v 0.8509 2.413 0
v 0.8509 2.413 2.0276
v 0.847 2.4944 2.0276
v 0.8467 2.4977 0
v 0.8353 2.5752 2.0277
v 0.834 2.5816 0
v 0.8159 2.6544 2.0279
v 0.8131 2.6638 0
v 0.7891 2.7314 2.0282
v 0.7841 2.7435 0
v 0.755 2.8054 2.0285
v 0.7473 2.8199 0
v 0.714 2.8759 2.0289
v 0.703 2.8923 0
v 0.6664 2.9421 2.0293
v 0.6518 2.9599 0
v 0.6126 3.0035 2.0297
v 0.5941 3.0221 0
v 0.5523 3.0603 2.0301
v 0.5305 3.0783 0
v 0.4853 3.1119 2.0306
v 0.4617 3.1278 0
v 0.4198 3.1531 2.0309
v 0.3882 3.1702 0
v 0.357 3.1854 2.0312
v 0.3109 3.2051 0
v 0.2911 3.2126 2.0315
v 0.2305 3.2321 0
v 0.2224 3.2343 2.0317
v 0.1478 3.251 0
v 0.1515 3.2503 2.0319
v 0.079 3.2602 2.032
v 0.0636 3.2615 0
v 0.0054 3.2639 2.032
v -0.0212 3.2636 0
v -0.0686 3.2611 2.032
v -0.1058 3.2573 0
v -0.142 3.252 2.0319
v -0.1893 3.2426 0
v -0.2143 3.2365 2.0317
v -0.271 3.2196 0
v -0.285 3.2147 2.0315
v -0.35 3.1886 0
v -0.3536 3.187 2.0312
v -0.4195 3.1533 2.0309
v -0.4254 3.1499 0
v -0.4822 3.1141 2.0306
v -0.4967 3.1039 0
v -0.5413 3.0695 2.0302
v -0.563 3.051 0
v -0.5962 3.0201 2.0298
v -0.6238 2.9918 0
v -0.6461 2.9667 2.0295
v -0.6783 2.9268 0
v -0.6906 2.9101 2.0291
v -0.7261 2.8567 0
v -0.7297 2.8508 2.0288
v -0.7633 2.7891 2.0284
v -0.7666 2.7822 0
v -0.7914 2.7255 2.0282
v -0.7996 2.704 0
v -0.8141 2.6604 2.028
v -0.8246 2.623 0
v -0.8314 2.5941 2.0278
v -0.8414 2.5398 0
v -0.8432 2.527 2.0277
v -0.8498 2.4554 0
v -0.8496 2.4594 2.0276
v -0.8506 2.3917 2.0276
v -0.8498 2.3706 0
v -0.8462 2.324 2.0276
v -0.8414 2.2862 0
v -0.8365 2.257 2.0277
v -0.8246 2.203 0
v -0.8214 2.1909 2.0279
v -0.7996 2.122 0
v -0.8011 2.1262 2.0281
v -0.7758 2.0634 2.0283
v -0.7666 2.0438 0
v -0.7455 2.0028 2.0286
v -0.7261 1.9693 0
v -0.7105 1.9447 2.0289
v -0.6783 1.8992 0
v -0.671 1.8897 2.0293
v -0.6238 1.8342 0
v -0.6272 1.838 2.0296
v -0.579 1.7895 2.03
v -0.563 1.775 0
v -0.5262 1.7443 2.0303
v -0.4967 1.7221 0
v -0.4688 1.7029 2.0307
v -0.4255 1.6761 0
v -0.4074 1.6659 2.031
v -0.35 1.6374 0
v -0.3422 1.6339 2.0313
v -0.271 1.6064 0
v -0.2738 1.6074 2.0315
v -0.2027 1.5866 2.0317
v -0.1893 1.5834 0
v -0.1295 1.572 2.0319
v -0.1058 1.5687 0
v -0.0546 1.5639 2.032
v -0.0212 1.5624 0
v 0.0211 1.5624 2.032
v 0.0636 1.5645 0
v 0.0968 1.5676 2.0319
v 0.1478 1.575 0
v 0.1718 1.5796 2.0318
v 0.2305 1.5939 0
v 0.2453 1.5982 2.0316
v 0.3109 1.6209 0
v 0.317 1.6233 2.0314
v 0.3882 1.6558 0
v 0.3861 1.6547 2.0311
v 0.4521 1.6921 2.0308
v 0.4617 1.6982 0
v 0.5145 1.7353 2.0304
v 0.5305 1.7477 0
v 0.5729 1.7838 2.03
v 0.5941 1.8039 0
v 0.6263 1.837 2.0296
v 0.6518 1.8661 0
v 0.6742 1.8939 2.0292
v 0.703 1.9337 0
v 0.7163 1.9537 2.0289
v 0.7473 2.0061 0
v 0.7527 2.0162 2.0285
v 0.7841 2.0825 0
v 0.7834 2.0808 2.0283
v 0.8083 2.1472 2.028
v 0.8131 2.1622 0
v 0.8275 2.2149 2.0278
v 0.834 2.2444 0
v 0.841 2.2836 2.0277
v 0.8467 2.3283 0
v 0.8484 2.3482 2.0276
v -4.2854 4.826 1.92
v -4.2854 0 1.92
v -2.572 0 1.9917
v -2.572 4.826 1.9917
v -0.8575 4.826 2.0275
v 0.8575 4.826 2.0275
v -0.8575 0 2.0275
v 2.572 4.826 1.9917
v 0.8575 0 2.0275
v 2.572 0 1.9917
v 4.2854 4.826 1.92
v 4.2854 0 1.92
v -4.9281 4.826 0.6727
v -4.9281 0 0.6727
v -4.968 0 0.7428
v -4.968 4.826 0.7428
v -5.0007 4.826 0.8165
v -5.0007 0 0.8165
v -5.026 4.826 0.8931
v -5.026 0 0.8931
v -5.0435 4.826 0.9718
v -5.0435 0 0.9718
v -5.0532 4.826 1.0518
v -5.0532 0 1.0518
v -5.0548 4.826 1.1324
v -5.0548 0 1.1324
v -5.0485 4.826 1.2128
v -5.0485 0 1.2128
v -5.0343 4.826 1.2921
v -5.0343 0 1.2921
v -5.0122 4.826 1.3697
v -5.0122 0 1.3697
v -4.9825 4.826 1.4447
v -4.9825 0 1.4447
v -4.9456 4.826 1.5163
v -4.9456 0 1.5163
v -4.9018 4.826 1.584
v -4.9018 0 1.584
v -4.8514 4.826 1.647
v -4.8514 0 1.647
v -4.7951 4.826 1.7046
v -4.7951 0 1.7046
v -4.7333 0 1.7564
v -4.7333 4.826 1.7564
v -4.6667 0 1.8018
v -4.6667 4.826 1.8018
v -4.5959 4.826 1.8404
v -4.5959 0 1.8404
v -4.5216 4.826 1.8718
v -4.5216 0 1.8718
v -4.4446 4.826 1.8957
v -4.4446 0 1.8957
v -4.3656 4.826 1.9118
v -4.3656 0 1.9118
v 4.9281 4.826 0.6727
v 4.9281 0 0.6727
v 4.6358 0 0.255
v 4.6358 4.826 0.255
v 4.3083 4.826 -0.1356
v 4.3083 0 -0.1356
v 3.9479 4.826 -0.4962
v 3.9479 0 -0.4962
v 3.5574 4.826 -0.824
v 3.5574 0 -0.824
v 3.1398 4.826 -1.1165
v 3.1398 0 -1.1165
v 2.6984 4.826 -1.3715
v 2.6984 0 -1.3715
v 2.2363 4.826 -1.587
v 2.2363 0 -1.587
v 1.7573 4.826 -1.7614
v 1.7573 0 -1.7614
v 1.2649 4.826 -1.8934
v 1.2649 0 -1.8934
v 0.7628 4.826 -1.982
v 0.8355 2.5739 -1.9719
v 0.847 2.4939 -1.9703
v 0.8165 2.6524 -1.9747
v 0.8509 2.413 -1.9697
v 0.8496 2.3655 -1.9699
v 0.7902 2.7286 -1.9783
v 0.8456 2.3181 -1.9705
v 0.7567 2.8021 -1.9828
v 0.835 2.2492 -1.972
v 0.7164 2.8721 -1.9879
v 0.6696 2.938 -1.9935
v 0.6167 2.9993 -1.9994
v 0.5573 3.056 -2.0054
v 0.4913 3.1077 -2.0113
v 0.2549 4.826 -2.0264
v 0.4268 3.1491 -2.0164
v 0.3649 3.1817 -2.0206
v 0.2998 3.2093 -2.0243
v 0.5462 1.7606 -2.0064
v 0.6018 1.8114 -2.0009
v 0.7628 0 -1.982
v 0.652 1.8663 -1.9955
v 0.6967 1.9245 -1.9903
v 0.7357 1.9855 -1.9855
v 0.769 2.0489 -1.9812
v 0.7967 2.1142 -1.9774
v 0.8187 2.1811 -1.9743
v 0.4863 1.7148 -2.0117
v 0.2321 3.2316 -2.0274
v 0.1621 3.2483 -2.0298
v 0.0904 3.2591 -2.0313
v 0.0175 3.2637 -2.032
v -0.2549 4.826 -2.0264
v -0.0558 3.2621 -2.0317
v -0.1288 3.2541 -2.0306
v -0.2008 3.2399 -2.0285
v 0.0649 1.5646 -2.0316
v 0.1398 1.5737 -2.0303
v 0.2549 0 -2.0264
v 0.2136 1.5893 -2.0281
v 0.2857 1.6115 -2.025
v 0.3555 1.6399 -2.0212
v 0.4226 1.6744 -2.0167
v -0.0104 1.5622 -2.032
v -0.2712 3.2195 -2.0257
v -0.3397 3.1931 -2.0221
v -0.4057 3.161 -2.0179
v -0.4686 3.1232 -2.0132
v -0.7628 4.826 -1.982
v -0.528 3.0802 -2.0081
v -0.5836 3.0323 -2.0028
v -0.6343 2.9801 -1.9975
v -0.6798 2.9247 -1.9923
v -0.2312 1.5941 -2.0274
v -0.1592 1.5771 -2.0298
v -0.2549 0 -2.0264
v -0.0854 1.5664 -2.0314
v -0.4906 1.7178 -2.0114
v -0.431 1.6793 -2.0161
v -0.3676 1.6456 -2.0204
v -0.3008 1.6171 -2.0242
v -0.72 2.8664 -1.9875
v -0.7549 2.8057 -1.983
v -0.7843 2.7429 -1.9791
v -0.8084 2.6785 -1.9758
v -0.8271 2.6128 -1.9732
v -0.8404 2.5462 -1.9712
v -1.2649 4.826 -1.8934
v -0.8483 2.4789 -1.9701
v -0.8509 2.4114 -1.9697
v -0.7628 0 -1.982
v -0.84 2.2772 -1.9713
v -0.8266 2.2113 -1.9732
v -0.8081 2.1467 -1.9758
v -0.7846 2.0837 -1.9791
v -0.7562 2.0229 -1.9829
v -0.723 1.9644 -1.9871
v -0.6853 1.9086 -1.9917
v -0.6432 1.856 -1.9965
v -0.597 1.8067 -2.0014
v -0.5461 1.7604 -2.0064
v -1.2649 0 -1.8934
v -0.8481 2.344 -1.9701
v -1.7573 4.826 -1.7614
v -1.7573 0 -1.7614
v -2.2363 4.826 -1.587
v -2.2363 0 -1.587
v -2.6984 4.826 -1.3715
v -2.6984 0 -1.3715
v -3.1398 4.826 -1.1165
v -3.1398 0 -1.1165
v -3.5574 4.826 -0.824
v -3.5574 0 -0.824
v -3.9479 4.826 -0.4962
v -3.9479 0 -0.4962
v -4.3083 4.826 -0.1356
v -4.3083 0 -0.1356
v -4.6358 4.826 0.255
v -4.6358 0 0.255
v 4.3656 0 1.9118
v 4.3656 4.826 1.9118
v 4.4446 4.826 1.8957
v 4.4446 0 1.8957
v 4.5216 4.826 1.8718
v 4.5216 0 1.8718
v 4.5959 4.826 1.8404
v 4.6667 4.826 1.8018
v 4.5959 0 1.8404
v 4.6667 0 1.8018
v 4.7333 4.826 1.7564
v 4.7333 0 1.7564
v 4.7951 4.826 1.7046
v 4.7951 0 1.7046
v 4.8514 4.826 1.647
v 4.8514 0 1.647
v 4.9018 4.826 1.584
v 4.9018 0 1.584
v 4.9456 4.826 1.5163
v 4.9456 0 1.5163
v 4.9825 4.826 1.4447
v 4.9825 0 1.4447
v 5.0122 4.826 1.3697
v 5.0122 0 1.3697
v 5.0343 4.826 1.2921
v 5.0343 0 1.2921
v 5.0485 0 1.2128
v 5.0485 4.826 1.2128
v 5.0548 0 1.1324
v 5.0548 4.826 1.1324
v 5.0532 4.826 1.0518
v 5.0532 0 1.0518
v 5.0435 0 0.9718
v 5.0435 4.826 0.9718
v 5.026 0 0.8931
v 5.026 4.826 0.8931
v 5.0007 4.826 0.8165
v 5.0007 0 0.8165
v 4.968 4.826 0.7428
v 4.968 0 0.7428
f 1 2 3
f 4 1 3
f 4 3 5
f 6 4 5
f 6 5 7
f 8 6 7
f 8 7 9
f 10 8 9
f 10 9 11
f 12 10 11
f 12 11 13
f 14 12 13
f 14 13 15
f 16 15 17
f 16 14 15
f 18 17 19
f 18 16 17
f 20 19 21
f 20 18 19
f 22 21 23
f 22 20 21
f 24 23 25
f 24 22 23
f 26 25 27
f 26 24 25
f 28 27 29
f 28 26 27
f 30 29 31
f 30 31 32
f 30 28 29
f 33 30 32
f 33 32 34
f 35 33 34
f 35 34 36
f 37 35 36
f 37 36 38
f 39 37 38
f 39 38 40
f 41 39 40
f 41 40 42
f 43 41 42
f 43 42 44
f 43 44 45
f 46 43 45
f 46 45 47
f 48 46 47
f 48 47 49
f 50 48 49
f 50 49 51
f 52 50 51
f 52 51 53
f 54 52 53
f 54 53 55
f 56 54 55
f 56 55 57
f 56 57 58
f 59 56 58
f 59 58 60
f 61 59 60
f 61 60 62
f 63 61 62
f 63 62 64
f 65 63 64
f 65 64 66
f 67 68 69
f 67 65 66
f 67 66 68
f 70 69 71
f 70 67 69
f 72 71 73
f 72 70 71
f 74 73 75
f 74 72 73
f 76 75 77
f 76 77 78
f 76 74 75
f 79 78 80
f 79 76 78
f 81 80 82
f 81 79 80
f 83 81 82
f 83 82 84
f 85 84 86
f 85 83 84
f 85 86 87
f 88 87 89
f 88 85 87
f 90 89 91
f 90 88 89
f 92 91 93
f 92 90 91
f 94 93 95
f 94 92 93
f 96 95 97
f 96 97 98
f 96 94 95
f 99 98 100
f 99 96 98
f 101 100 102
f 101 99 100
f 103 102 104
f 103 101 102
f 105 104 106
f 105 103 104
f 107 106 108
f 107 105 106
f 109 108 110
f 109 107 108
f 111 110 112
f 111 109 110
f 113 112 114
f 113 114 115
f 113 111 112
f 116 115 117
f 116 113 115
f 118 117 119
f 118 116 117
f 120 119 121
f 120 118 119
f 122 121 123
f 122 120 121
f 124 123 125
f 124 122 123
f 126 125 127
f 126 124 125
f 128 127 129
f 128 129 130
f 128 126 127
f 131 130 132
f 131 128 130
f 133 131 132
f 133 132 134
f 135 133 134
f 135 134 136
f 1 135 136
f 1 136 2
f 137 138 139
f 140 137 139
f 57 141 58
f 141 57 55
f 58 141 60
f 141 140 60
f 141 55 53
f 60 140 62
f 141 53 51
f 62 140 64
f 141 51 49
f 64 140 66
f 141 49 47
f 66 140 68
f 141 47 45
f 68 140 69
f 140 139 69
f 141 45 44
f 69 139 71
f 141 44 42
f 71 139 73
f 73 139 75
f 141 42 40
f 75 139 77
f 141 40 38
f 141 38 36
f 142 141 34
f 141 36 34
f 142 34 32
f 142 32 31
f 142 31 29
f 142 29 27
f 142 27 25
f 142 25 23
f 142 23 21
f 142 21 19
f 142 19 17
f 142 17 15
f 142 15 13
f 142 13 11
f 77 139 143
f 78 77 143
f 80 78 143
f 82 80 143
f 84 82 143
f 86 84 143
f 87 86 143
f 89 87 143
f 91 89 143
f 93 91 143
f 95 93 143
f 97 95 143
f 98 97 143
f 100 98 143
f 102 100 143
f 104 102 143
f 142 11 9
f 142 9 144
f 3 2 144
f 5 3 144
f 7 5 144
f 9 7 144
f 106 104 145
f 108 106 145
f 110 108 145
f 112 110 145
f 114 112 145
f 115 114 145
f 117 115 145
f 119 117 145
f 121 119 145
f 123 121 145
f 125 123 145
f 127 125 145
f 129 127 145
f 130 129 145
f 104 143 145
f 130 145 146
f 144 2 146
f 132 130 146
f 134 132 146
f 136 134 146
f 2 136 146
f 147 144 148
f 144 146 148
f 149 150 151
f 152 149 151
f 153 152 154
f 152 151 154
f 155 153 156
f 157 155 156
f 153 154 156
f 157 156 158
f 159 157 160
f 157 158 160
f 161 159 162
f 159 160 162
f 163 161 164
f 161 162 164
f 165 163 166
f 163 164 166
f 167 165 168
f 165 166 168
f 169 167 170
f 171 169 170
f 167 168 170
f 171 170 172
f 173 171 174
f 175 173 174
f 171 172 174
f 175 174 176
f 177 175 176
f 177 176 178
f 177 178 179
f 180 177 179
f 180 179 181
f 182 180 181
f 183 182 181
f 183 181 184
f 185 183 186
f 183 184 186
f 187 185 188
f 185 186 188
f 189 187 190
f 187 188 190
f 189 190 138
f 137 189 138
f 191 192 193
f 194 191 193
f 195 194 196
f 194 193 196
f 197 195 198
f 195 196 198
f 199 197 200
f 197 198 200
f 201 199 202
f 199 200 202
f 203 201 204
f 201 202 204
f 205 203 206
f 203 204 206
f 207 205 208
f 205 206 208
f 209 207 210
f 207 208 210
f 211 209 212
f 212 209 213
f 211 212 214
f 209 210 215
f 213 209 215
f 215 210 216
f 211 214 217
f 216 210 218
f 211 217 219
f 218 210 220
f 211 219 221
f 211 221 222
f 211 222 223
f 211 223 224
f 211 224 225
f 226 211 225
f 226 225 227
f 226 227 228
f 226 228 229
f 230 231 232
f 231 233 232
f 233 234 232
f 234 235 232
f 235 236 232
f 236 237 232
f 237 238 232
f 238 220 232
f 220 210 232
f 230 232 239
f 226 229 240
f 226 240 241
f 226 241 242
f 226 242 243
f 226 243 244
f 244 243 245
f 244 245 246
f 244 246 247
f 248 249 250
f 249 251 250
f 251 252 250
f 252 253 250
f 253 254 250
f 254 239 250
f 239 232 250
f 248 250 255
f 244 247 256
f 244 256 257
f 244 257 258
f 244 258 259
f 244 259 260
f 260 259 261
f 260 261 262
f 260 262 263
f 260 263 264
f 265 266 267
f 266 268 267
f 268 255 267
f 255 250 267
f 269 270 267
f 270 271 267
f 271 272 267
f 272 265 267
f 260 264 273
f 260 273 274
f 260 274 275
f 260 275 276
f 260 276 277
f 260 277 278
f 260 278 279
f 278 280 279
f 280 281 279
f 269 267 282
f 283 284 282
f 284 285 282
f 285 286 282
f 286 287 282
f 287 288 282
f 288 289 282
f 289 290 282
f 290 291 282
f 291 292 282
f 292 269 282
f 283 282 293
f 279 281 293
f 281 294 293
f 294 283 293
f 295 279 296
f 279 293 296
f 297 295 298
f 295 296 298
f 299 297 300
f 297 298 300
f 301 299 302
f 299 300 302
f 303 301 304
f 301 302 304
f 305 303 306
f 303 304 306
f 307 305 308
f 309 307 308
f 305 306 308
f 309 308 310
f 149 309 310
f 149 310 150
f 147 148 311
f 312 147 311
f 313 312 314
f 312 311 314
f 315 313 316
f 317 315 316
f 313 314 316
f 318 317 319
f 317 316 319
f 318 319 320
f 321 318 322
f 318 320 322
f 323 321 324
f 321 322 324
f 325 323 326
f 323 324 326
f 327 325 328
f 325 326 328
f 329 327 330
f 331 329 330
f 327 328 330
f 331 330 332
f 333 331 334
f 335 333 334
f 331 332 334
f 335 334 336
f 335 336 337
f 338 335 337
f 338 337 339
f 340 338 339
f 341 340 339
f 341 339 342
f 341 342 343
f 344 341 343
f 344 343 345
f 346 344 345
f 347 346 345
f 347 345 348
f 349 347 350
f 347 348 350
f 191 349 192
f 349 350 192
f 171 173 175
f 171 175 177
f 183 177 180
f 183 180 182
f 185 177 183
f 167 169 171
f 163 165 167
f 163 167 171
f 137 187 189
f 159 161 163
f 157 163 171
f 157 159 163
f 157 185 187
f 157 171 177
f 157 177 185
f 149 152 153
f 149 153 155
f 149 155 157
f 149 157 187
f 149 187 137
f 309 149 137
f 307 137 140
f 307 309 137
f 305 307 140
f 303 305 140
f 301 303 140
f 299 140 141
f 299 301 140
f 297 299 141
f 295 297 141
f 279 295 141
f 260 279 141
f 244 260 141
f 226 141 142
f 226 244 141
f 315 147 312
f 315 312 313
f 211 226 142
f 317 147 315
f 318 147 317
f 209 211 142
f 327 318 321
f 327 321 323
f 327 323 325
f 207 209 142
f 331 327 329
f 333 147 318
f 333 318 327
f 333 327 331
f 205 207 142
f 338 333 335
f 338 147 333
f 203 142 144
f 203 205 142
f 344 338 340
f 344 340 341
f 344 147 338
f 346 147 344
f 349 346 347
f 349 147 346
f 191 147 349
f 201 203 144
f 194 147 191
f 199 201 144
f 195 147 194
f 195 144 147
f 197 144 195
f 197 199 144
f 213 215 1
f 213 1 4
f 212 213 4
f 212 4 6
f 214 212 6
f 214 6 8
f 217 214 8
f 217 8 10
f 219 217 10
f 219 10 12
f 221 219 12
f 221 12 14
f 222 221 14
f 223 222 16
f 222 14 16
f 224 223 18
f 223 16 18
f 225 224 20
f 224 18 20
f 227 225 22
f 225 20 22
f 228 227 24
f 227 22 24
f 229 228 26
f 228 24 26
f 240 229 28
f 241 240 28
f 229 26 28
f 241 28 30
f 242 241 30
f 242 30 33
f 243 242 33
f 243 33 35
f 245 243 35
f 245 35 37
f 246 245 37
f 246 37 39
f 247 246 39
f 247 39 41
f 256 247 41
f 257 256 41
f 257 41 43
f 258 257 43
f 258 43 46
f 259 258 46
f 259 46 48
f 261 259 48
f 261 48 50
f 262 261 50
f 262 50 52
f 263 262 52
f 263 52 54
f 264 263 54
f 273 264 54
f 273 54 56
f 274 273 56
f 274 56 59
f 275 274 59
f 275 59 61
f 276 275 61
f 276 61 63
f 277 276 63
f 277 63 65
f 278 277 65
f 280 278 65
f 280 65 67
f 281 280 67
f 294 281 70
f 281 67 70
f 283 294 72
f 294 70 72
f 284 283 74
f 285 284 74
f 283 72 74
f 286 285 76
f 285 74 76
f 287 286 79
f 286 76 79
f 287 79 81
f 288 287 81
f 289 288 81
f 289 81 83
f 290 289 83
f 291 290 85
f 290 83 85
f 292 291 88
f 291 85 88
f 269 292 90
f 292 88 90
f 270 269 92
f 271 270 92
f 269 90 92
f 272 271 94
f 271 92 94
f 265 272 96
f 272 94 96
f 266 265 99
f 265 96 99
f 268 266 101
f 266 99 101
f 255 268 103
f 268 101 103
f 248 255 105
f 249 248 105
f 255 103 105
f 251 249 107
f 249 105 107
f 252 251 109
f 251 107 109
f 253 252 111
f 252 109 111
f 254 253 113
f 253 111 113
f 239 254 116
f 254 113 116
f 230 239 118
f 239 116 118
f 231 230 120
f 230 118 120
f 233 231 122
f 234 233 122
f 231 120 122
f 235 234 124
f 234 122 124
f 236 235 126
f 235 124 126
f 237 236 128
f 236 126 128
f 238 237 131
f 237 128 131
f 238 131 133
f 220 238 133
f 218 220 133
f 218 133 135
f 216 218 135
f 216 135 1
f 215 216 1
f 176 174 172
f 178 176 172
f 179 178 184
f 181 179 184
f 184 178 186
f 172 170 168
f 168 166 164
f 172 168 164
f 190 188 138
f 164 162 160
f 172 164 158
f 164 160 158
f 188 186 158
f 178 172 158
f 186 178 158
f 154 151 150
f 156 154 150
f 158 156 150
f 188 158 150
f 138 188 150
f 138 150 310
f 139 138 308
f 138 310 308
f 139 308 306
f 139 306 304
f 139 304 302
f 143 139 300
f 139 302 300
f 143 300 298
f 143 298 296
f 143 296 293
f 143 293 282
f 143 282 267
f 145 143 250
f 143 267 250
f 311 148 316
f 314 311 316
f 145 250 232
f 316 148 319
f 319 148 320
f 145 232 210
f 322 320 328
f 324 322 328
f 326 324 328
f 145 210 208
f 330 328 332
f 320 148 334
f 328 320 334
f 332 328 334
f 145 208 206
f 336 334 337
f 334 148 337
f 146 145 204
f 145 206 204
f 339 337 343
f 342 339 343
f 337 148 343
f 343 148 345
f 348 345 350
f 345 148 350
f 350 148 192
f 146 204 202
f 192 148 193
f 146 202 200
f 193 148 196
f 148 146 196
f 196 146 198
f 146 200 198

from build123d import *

# Parameters (mm, degrees)
BOSS_EXTRUDE1_DEPTH     = 4.826
CUT_EXTRUDE1_DEPTH      = 4.826
CUT_EXTRUDE1_DEPTH_BACK = 4.826
SKETCH2_R               = 0.8509


with BuildPart() as part:
    # Sketch1 → Boss-Extrude1 (new body)
    with BuildSketch(Plane(origin=(0, 0, 0), x_dir=(1, 0, 0), z_dir=(0, 1, 0))):
        with BuildLine():
            ThreePointArc((-4.285409449, -1.920000792), (0, -2.032), (4.285409449, -1.920000792))
            ThreePointArc((4.285409449, -1.920000792), (4.964968073, -1.480948711), (4.928136529, -0.672734574))
            ThreePointArc((4.928136529, -0.672734574), (0, 2.032), (-4.928136529, -0.672734574))
            ThreePointArc((-4.928136529, -0.672734574), (-4.964968073, -1.480948711), (-4.285409449, -1.920000792))
        make_face()
    extrude(amount=BOSS_EXTRUDE1_DEPTH)

    # Sketch2 → Cut-Extrude1 (cut, two sides: drawn at the far end of the back side and taken through both)
    with BuildSketch(Plane.XY.offset(-CUT_EXTRUDE1_DEPTH_BACK)):
        with Locations((0, 2.413)):
            Circle(SKETCH2_R)
    extrude(amount=CUT_EXTRUDE1_DEPTH + CUT_EXTRUDE1_DEPTH_BACK, mode=Mode.SUBTRACT)


solid = part.part
